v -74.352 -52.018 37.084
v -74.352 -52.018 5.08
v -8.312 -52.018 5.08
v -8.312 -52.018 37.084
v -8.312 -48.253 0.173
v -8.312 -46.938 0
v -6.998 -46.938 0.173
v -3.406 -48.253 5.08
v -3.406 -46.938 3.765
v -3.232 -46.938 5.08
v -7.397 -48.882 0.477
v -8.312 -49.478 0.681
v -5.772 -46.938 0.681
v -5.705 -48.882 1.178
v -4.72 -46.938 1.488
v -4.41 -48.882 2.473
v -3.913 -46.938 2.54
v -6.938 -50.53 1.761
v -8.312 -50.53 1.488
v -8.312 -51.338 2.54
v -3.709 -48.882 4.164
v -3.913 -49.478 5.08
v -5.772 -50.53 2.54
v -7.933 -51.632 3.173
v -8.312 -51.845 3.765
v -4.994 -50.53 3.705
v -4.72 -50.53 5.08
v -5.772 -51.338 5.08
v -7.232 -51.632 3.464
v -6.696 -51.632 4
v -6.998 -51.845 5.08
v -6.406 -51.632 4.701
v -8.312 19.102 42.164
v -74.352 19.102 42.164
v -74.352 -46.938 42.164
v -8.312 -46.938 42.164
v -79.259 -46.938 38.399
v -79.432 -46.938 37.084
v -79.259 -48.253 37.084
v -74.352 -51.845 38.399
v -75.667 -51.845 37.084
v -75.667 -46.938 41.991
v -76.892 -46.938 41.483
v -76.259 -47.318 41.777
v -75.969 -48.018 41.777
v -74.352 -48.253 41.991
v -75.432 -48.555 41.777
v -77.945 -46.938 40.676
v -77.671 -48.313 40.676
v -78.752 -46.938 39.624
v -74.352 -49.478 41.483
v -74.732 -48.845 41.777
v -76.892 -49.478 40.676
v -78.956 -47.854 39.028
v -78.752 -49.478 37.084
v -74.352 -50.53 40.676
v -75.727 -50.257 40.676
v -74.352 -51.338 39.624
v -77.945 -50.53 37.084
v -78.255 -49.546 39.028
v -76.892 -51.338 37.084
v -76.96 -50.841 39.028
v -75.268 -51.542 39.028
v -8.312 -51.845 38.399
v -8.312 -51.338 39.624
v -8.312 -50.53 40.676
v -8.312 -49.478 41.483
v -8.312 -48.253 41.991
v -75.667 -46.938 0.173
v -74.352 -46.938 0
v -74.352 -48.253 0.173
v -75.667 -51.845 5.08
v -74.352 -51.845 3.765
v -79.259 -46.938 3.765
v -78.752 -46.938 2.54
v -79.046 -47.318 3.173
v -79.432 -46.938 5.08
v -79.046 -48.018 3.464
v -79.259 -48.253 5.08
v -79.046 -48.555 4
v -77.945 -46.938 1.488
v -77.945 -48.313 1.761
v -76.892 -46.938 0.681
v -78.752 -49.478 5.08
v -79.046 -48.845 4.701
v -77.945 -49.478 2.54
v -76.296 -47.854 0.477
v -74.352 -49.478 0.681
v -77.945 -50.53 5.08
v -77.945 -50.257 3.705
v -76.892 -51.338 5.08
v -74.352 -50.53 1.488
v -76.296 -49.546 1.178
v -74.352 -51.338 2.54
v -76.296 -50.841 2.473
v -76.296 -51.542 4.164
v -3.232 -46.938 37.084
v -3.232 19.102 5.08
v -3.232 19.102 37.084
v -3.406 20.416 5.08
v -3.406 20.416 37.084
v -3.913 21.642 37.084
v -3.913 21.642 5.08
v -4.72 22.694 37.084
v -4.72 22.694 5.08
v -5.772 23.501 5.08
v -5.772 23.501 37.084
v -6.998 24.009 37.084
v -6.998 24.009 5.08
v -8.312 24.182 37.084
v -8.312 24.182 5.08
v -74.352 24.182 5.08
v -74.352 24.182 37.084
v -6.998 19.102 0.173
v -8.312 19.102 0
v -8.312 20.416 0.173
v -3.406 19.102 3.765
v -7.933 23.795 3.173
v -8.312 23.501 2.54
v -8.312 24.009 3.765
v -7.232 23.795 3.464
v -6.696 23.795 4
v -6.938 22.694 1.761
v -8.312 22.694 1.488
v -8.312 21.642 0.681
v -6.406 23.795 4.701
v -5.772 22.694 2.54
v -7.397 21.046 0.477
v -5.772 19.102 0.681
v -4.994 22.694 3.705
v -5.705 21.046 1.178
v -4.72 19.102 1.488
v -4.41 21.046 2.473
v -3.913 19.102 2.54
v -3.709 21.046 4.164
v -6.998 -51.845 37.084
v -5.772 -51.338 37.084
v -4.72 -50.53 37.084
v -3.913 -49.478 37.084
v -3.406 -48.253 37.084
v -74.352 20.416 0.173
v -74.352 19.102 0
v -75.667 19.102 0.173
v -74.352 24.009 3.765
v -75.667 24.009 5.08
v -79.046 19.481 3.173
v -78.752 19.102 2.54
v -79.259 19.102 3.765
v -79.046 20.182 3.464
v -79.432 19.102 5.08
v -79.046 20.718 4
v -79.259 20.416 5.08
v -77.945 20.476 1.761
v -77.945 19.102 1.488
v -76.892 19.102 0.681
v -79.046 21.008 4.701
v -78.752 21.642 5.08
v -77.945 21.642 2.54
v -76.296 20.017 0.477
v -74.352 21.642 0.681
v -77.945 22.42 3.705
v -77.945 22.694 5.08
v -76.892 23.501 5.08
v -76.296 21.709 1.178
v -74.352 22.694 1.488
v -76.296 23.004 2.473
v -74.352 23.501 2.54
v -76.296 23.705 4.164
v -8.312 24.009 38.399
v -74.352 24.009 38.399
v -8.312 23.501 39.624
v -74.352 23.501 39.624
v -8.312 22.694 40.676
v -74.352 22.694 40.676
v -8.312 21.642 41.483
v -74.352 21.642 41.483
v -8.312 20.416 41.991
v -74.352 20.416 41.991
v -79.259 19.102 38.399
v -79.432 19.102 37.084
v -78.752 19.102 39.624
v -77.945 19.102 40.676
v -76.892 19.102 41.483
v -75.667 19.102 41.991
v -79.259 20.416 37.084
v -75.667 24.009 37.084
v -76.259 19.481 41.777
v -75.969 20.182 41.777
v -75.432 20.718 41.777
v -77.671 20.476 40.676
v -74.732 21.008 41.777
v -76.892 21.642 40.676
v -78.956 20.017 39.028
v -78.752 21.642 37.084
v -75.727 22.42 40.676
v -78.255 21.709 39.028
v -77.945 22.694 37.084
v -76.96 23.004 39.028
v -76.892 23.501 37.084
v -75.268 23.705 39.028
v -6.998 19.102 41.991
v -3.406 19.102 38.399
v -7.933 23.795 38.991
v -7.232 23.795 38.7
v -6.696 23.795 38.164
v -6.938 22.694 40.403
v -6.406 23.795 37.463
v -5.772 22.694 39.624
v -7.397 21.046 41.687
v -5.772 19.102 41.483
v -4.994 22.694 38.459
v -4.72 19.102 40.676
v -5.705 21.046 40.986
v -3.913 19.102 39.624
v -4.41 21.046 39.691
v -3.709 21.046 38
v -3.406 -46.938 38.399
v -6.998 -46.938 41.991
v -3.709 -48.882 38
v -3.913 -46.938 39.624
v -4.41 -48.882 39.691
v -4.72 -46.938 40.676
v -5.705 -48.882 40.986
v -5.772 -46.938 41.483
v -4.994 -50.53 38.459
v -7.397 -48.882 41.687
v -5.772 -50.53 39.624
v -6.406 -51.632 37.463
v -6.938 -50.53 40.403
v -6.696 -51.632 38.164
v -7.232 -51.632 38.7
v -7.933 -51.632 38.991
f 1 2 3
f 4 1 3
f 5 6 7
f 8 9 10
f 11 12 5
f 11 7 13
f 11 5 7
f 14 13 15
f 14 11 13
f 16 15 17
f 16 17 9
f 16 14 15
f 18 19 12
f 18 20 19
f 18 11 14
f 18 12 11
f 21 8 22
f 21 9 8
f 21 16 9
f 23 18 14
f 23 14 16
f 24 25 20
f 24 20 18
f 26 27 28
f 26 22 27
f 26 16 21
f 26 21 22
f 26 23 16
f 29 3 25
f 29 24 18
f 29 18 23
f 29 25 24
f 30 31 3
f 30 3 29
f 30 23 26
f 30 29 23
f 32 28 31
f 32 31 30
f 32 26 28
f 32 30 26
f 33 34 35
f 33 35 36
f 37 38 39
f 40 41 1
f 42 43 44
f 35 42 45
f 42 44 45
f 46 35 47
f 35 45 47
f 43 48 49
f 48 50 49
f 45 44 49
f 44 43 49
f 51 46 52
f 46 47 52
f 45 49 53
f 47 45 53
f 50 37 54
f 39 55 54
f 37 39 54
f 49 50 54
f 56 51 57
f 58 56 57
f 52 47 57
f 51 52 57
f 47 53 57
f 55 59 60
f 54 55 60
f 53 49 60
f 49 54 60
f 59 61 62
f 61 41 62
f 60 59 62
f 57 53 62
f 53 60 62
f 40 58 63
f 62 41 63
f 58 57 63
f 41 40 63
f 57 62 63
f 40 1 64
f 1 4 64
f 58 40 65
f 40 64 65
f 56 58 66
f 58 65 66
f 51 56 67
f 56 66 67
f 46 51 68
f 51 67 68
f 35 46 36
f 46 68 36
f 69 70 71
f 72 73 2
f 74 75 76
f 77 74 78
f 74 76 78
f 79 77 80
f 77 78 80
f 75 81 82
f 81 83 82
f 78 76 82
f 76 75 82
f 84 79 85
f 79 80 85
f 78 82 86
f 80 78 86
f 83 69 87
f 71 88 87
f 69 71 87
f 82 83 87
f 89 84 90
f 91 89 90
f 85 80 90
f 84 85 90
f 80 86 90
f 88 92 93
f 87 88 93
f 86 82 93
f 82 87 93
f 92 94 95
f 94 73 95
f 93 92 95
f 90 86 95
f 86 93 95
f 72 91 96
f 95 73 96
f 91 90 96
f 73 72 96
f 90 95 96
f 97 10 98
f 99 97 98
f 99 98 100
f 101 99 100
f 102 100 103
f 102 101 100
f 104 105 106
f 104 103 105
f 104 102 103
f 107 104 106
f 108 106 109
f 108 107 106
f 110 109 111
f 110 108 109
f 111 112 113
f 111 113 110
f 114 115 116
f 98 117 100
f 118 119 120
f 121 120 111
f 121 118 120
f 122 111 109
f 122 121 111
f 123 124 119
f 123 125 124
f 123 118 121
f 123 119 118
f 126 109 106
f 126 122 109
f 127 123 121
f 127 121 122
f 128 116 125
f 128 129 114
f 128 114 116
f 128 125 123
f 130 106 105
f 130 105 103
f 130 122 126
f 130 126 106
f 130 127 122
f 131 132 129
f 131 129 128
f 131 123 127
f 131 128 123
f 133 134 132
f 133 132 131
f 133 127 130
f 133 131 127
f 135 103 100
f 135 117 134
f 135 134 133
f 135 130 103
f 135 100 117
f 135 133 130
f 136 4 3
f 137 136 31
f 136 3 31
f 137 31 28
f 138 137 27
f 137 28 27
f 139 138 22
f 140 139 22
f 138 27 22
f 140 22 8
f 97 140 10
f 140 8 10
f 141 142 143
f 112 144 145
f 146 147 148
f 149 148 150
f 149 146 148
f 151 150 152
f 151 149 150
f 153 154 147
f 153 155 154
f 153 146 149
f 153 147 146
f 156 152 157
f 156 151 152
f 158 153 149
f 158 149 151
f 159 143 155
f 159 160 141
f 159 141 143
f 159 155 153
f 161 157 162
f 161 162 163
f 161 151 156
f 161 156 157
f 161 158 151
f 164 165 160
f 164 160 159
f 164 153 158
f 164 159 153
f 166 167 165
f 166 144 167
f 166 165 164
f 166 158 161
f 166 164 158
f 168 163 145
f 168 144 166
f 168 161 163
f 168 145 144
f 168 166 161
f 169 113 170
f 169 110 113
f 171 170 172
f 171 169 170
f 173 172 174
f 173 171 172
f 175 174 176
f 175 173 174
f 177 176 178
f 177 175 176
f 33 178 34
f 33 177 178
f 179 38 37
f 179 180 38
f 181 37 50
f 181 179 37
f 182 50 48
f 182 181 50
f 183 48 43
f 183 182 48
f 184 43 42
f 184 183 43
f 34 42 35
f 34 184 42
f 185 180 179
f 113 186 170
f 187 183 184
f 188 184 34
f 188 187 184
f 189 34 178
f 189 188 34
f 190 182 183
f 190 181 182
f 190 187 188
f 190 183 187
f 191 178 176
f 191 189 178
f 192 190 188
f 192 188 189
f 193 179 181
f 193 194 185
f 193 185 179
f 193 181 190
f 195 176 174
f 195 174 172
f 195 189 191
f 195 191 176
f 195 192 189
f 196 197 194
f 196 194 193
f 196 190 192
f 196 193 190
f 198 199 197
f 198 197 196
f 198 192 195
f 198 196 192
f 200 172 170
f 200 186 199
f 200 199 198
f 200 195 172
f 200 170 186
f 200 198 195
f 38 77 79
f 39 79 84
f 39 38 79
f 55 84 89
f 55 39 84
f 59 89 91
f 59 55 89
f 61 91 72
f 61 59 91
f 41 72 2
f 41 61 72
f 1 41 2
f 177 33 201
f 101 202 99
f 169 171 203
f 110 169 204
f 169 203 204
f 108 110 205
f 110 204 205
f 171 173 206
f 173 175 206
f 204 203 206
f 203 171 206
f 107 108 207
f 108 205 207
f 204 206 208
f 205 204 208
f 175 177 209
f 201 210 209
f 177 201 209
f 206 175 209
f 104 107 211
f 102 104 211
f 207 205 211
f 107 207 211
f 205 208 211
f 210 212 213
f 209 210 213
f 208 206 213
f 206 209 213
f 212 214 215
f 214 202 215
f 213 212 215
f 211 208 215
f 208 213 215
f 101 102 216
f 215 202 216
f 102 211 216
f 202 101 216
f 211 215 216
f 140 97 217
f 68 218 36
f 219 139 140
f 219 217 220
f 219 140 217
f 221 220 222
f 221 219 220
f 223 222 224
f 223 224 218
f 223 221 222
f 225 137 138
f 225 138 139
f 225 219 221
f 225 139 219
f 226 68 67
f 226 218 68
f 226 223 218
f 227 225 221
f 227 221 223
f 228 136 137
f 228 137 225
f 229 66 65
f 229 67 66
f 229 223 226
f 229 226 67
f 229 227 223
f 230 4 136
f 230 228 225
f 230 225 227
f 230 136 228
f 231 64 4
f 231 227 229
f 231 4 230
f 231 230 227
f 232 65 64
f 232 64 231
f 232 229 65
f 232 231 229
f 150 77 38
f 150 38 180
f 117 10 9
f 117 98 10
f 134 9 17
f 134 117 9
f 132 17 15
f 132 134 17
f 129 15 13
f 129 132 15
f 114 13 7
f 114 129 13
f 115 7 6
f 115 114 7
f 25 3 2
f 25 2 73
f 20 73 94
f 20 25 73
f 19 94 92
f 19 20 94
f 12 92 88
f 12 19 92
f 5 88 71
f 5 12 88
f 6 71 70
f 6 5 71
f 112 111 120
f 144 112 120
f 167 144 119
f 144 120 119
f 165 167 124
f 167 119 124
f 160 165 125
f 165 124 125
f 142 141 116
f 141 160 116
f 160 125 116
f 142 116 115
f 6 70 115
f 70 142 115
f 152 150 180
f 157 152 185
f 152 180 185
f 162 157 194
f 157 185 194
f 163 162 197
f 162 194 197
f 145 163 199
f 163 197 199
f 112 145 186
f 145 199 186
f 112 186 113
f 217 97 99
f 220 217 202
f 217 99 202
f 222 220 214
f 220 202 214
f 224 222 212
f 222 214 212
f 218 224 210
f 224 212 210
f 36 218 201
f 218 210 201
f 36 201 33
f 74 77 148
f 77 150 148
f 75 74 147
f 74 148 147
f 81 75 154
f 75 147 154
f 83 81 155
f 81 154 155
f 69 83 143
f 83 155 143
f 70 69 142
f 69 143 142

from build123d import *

# Parameters (mm, degrees)
F0_W         = 76.2
F0_H         = 76.2
F0_W_2       = 3.4224579499
F0_H_2       = 7.5862997554
F1_DEPTH     = 42.164
F2_R         = 5.08
F3_T1_DEPTH  = 32.004
F3_S5_W      = 5.08
F3_S5_H      = 5.08
F3_T6_DEPTH  = 5.08
F3_S11_W     = 5.08
F3_S11_H     = 5.08
F3_T12_DEPTH = 5.08


# Not quite as in the source:
# - a fillet or chamfer that OpenCascade refuses, or shapes differently, is made with other operations: its cross-section is extruded or revolved along the edge and cut away or added


with BuildPart() as f1:
    # F0 (on Top) → F1 (new body)
    with BuildSketch(Plane.XY):
        with Locations((-41.3324069232, -13.9183843632)):
            Rectangle(F0_W, F0_H)
        with Locations((-63.0685785115, -38.5174307738)):
            Rectangle(F0_W_2, F0_H_2, mode=Mode.SUBTRACT)
        with Locations((-63.0685785115, -38.5174307738)):
            Rectangle(F0_W_2, F0_H_2)
    extrude(amount=F1_DEPTH)

    # F2
    f2_edges = [f1.edges().sort_by_distance(p)[0] for p in [
        (-41.332407, -52.018384, 0),
        (-3.232407, -13.918384, 0),
        (-41.332407, 24.181616, 0),
        (-79.432407, -13.918384, 0),
        (-79.432407, 24.181616, 21.082),
        (-79.432407, -52.018384, 21.082),
        (-79.432407, -13.918384, 42.164),
        (-41.332407, -52.018384, 42.164),
        (-3.232407, -13.918384, 42.164),
        (-41.332407, 24.181616, 42.164),
        (-3.232407, 24.181616, 21.082),
    ]]
    fillet(f2_edges, radius=F2_R)

    # F3: fillet of radius 5.08 on 1 edges, made by hand

    # F3_s2 → F3_t1 (cut)
    with BuildSketch(Plane.XY.offset(5.08)):
        with BuildLine():
            ThreePointArc((-8.3124069232, -52.0183843632), (-4.7203044747, -50.5304868116), (-3.2324069232, -46.9383843632))
            Line((-3.2324069232, -46.9383843632), (-3.2324069232, -52.0183843632))
            Line((-3.2324069232, -52.0183843632), (-8.3124069232, -52.0183843632))
        make_face()
    extrude(amount=F3_T1_DEPTH, mode=Mode.SUBTRACT)


with BuildPart() as f3_tool4:
    # F3_s5 → F3_t6 (new body)
    with BuildSketch(Plane.XZ.offset(46.9383843632)):
        with Locations((-5.7724069232, 2.54)):
            Rectangle(F3_S5_W, F3_S5_H)
    extrude(amount=F3_T6_DEPTH)

    # F3_s7 → F3_t8 (revolve, cut)
    with BuildSketch(Plane(origin=(-8.3124069232, -46.9383843632, 5.08), x_dir=(-0.7071067812, 0, 0.7071067812), z_dir=(0.7071067812, 0, 0.7071067812))):
        with BuildLine():
            ThreePointArc((0, -5.08), (5.08, 0), (0, 5.08))
            Line((0, 5.08), (0, -5.08))
        make_face()
    revolve(axis=Axis((-8.3124069232, -46.9383843632, 5.08), (0, -1, 0)), mode=Mode.SUBTRACT)


with BuildPart() as f1_1:
    add(f1.part)

    # F3_t3: cut F3_tool4
    add(f3_tool4.part, mode=Mode.SUBTRACT)


with BuildPart() as f3_tool10:
    # F3_s11 → F3_t12 (new body)
    with BuildSketch(Plane.XZ.offset(46.9383843632)):
        with Locations((-5.7724069232, 39.624)):
            Rectangle(F3_S11_W, F3_S11_H)
    extrude(amount=F3_T12_DEPTH)

    # F3_s13 → F3_t14 (revolve, cut)
    with BuildSketch(Plane(origin=(-8.3124069232, -46.9383843632, 37.084), x_dir=(-0.7071067812, 0, -0.7071067812), z_dir=(-0.7071067812, 0, 0.7071067812))):
        with BuildLine():
            ThreePointArc((0, -5.08), (5.08, 0), (0, 5.08))
            Line((0, 5.08), (0, -5.08))
        make_face()
    revolve(axis=Axis((-8.3124069232, -46.9383843632, 37.084), (0, -1, 0)), mode=Mode.SUBTRACT)


with BuildPart() as f1_2:
    add(f1_1.part)

    # F3_t9: cut F3_tool10
    add(f3_tool10.part, mode=Mode.SUBTRACT)


solid = f1_2.part
